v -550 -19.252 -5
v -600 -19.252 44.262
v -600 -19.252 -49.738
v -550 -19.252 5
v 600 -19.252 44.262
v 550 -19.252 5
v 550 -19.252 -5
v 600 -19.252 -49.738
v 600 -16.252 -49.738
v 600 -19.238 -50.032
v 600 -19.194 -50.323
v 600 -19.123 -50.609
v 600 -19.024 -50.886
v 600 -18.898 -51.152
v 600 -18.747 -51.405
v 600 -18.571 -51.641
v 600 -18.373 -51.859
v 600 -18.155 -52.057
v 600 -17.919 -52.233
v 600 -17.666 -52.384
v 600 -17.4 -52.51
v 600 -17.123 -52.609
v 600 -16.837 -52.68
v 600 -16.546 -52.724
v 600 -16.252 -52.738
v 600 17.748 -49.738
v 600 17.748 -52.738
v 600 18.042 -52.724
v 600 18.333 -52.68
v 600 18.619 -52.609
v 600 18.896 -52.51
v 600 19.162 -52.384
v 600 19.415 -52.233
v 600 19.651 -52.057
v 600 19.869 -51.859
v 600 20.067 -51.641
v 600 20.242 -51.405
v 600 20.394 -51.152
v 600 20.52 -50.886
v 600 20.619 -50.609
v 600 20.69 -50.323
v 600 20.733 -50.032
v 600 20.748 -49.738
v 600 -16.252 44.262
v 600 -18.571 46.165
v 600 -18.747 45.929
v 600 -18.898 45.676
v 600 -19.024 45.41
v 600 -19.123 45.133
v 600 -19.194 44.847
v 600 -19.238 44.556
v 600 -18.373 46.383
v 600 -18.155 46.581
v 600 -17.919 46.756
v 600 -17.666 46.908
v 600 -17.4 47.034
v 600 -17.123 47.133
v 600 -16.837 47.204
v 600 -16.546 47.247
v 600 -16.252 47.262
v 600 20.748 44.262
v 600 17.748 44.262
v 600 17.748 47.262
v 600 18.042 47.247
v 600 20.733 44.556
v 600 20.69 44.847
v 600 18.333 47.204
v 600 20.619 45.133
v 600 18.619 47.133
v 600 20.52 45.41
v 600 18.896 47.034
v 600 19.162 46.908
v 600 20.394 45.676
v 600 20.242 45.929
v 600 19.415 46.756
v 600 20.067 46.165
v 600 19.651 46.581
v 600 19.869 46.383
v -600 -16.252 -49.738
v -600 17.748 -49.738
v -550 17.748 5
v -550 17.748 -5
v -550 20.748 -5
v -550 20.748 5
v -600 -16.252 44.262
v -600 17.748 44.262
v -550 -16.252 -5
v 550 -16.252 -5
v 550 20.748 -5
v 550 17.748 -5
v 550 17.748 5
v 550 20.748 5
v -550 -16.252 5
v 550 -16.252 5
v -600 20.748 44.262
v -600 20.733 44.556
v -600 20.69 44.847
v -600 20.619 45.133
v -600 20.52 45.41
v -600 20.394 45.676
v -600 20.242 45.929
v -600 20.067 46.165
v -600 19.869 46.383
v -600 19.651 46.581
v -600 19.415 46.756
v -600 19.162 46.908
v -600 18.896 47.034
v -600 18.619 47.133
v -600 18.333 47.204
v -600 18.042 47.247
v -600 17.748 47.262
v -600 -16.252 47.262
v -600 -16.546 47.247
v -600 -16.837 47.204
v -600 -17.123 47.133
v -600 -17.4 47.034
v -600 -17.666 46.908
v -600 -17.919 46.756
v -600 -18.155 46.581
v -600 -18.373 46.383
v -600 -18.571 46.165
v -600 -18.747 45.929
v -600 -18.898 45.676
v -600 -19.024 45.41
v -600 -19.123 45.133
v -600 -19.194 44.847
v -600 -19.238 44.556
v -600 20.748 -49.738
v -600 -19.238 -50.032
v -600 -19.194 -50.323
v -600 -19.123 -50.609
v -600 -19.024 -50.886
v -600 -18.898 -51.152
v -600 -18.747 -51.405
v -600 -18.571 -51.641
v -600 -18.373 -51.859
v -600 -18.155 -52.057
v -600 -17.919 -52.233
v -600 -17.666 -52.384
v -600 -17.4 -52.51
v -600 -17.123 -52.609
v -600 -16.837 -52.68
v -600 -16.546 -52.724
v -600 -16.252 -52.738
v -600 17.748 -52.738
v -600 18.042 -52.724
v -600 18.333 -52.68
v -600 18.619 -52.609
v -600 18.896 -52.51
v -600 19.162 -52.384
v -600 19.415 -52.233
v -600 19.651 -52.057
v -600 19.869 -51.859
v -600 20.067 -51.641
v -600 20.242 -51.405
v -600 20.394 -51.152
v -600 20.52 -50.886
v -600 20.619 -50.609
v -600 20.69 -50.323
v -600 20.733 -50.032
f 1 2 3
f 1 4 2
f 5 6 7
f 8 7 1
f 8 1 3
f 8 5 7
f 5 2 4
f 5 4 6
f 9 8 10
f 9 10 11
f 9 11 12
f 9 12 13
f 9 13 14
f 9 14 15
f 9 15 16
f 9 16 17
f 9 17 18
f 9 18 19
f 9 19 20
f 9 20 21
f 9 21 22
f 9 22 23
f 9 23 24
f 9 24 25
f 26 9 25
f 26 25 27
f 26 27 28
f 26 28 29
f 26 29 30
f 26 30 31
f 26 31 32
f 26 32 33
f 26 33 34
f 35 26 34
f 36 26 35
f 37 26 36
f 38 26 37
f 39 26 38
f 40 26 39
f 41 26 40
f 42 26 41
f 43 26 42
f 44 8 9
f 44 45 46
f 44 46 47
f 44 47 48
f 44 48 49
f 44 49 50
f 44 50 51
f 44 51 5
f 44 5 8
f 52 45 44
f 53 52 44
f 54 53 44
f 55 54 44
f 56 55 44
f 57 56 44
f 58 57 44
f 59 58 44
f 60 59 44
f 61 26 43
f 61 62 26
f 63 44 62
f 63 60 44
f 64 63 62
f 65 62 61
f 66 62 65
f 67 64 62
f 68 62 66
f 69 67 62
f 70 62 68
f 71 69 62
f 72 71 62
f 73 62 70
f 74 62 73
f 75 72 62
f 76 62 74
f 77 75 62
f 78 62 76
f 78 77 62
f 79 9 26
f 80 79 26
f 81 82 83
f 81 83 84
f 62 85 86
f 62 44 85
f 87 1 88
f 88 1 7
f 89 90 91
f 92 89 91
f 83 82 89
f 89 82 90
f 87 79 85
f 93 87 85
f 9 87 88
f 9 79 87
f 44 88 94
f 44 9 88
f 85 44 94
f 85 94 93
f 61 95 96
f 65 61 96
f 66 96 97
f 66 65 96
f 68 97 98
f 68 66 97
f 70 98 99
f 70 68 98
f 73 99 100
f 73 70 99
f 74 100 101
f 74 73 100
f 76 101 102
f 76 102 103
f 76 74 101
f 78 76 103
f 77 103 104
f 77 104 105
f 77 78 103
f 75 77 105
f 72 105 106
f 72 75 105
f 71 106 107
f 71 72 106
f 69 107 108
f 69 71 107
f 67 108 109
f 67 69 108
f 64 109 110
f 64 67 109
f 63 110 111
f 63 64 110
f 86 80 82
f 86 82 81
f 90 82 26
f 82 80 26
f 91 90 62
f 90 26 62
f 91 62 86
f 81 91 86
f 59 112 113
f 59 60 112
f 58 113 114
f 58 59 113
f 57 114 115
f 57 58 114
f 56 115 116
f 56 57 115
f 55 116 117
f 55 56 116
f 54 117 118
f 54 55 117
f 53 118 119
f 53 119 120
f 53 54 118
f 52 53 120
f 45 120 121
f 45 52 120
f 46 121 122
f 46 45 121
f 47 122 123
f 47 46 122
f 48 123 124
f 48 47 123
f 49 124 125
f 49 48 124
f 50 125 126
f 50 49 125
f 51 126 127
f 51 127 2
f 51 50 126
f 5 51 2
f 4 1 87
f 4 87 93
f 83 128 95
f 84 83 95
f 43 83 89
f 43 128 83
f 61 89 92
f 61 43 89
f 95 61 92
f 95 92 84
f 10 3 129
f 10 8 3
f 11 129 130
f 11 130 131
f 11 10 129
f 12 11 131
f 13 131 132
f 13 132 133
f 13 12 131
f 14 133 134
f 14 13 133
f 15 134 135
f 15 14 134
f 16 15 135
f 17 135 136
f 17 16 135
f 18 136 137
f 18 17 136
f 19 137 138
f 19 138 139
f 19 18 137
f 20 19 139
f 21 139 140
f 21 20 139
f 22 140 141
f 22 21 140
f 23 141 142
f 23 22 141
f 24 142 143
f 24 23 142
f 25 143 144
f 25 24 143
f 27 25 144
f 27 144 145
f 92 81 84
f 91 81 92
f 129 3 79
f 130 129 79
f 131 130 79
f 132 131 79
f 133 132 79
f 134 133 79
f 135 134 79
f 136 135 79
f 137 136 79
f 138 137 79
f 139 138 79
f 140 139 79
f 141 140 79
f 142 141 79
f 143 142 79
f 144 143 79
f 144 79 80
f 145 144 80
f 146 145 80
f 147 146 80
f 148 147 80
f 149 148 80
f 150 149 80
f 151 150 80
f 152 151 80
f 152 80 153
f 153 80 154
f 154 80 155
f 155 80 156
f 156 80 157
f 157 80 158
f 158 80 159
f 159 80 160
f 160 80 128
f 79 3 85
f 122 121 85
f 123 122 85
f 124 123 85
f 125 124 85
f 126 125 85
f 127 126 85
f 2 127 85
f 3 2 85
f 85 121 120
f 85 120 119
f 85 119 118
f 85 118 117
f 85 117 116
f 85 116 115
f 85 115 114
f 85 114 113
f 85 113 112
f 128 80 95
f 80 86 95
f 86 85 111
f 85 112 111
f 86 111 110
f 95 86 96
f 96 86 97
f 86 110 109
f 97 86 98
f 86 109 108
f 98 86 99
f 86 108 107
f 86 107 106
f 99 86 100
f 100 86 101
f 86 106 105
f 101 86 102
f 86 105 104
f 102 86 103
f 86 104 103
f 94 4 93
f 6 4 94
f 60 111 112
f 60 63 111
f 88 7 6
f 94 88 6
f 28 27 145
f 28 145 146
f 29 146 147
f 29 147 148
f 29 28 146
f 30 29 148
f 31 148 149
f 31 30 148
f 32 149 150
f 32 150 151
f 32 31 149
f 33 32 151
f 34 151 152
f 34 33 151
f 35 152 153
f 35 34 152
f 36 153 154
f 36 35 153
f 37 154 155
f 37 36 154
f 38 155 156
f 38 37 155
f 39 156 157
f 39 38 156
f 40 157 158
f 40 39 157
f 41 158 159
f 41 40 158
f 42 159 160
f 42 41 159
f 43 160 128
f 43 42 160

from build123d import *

# Parameters (mm, degrees)
F1_W     = 34
F1_H     = 94
F2_DEPTH = 600
F5_W     = 1100
F5_H     = 10
F6_DEPTH = 40.001


with BuildPart() as f2:
    # F1 (on Right) → F2 (new body, symmetric)
    with BuildSketch(Plane.YZ):
        with BuildLine():
            ThreePointArc((-19.2521204937, -49.7380952381), (-18.3734408372, -51.8594155817), (-16.2521204937, -52.7380952381))
            Line((-16.2521204937, -52.7380952381), (17.7478795063, -52.7380952381))
            ThreePointArc((17.7478795063, -52.7380952381), (19.8691998499, -51.8594155817), (20.7478795063, -49.7380952381))
            Line((20.7478795063, -49.7380952381), (20.7478795063, 44.2619047619))
            ThreePointArc((20.7478795063, 44.2619047619), (19.8691998499, 46.3832251055), (17.7478795063, 47.2619047619))
            Line((17.7478795063, 47.2619047619), (-16.2521204937, 47.2619047619))
            ThreePointArc((-16.2521204937, 47.2619047619), (-18.3734408372, 46.3832251055), (-19.2521204937, 44.2619047619))
            Line((-19.2521204937, 44.2619047619), (-19.2521204937, -49.7380952381))
        make_face()
        with Locations((0.7478795063, -2.7380952381)):
            Rectangle(F1_W, F1_H, mode=Mode.SUBTRACT)
    extrude(amount=F2_DEPTH, both=True)


with BuildPart() as f3_1:
    # F3: copy of F2
    add(f2.part)


with BuildPart() as f2_1:
    add(f2.part)

    # F5 (on face) → F6 (cut, through all)
    with BuildSketch(Plane.XZ.offset(19.2521204937)):
        Rectangle(F5_W, F5_H)
    extrude(amount=-F6_DEPTH, mode=Mode.SUBTRACT)


solid = f2_1.part
